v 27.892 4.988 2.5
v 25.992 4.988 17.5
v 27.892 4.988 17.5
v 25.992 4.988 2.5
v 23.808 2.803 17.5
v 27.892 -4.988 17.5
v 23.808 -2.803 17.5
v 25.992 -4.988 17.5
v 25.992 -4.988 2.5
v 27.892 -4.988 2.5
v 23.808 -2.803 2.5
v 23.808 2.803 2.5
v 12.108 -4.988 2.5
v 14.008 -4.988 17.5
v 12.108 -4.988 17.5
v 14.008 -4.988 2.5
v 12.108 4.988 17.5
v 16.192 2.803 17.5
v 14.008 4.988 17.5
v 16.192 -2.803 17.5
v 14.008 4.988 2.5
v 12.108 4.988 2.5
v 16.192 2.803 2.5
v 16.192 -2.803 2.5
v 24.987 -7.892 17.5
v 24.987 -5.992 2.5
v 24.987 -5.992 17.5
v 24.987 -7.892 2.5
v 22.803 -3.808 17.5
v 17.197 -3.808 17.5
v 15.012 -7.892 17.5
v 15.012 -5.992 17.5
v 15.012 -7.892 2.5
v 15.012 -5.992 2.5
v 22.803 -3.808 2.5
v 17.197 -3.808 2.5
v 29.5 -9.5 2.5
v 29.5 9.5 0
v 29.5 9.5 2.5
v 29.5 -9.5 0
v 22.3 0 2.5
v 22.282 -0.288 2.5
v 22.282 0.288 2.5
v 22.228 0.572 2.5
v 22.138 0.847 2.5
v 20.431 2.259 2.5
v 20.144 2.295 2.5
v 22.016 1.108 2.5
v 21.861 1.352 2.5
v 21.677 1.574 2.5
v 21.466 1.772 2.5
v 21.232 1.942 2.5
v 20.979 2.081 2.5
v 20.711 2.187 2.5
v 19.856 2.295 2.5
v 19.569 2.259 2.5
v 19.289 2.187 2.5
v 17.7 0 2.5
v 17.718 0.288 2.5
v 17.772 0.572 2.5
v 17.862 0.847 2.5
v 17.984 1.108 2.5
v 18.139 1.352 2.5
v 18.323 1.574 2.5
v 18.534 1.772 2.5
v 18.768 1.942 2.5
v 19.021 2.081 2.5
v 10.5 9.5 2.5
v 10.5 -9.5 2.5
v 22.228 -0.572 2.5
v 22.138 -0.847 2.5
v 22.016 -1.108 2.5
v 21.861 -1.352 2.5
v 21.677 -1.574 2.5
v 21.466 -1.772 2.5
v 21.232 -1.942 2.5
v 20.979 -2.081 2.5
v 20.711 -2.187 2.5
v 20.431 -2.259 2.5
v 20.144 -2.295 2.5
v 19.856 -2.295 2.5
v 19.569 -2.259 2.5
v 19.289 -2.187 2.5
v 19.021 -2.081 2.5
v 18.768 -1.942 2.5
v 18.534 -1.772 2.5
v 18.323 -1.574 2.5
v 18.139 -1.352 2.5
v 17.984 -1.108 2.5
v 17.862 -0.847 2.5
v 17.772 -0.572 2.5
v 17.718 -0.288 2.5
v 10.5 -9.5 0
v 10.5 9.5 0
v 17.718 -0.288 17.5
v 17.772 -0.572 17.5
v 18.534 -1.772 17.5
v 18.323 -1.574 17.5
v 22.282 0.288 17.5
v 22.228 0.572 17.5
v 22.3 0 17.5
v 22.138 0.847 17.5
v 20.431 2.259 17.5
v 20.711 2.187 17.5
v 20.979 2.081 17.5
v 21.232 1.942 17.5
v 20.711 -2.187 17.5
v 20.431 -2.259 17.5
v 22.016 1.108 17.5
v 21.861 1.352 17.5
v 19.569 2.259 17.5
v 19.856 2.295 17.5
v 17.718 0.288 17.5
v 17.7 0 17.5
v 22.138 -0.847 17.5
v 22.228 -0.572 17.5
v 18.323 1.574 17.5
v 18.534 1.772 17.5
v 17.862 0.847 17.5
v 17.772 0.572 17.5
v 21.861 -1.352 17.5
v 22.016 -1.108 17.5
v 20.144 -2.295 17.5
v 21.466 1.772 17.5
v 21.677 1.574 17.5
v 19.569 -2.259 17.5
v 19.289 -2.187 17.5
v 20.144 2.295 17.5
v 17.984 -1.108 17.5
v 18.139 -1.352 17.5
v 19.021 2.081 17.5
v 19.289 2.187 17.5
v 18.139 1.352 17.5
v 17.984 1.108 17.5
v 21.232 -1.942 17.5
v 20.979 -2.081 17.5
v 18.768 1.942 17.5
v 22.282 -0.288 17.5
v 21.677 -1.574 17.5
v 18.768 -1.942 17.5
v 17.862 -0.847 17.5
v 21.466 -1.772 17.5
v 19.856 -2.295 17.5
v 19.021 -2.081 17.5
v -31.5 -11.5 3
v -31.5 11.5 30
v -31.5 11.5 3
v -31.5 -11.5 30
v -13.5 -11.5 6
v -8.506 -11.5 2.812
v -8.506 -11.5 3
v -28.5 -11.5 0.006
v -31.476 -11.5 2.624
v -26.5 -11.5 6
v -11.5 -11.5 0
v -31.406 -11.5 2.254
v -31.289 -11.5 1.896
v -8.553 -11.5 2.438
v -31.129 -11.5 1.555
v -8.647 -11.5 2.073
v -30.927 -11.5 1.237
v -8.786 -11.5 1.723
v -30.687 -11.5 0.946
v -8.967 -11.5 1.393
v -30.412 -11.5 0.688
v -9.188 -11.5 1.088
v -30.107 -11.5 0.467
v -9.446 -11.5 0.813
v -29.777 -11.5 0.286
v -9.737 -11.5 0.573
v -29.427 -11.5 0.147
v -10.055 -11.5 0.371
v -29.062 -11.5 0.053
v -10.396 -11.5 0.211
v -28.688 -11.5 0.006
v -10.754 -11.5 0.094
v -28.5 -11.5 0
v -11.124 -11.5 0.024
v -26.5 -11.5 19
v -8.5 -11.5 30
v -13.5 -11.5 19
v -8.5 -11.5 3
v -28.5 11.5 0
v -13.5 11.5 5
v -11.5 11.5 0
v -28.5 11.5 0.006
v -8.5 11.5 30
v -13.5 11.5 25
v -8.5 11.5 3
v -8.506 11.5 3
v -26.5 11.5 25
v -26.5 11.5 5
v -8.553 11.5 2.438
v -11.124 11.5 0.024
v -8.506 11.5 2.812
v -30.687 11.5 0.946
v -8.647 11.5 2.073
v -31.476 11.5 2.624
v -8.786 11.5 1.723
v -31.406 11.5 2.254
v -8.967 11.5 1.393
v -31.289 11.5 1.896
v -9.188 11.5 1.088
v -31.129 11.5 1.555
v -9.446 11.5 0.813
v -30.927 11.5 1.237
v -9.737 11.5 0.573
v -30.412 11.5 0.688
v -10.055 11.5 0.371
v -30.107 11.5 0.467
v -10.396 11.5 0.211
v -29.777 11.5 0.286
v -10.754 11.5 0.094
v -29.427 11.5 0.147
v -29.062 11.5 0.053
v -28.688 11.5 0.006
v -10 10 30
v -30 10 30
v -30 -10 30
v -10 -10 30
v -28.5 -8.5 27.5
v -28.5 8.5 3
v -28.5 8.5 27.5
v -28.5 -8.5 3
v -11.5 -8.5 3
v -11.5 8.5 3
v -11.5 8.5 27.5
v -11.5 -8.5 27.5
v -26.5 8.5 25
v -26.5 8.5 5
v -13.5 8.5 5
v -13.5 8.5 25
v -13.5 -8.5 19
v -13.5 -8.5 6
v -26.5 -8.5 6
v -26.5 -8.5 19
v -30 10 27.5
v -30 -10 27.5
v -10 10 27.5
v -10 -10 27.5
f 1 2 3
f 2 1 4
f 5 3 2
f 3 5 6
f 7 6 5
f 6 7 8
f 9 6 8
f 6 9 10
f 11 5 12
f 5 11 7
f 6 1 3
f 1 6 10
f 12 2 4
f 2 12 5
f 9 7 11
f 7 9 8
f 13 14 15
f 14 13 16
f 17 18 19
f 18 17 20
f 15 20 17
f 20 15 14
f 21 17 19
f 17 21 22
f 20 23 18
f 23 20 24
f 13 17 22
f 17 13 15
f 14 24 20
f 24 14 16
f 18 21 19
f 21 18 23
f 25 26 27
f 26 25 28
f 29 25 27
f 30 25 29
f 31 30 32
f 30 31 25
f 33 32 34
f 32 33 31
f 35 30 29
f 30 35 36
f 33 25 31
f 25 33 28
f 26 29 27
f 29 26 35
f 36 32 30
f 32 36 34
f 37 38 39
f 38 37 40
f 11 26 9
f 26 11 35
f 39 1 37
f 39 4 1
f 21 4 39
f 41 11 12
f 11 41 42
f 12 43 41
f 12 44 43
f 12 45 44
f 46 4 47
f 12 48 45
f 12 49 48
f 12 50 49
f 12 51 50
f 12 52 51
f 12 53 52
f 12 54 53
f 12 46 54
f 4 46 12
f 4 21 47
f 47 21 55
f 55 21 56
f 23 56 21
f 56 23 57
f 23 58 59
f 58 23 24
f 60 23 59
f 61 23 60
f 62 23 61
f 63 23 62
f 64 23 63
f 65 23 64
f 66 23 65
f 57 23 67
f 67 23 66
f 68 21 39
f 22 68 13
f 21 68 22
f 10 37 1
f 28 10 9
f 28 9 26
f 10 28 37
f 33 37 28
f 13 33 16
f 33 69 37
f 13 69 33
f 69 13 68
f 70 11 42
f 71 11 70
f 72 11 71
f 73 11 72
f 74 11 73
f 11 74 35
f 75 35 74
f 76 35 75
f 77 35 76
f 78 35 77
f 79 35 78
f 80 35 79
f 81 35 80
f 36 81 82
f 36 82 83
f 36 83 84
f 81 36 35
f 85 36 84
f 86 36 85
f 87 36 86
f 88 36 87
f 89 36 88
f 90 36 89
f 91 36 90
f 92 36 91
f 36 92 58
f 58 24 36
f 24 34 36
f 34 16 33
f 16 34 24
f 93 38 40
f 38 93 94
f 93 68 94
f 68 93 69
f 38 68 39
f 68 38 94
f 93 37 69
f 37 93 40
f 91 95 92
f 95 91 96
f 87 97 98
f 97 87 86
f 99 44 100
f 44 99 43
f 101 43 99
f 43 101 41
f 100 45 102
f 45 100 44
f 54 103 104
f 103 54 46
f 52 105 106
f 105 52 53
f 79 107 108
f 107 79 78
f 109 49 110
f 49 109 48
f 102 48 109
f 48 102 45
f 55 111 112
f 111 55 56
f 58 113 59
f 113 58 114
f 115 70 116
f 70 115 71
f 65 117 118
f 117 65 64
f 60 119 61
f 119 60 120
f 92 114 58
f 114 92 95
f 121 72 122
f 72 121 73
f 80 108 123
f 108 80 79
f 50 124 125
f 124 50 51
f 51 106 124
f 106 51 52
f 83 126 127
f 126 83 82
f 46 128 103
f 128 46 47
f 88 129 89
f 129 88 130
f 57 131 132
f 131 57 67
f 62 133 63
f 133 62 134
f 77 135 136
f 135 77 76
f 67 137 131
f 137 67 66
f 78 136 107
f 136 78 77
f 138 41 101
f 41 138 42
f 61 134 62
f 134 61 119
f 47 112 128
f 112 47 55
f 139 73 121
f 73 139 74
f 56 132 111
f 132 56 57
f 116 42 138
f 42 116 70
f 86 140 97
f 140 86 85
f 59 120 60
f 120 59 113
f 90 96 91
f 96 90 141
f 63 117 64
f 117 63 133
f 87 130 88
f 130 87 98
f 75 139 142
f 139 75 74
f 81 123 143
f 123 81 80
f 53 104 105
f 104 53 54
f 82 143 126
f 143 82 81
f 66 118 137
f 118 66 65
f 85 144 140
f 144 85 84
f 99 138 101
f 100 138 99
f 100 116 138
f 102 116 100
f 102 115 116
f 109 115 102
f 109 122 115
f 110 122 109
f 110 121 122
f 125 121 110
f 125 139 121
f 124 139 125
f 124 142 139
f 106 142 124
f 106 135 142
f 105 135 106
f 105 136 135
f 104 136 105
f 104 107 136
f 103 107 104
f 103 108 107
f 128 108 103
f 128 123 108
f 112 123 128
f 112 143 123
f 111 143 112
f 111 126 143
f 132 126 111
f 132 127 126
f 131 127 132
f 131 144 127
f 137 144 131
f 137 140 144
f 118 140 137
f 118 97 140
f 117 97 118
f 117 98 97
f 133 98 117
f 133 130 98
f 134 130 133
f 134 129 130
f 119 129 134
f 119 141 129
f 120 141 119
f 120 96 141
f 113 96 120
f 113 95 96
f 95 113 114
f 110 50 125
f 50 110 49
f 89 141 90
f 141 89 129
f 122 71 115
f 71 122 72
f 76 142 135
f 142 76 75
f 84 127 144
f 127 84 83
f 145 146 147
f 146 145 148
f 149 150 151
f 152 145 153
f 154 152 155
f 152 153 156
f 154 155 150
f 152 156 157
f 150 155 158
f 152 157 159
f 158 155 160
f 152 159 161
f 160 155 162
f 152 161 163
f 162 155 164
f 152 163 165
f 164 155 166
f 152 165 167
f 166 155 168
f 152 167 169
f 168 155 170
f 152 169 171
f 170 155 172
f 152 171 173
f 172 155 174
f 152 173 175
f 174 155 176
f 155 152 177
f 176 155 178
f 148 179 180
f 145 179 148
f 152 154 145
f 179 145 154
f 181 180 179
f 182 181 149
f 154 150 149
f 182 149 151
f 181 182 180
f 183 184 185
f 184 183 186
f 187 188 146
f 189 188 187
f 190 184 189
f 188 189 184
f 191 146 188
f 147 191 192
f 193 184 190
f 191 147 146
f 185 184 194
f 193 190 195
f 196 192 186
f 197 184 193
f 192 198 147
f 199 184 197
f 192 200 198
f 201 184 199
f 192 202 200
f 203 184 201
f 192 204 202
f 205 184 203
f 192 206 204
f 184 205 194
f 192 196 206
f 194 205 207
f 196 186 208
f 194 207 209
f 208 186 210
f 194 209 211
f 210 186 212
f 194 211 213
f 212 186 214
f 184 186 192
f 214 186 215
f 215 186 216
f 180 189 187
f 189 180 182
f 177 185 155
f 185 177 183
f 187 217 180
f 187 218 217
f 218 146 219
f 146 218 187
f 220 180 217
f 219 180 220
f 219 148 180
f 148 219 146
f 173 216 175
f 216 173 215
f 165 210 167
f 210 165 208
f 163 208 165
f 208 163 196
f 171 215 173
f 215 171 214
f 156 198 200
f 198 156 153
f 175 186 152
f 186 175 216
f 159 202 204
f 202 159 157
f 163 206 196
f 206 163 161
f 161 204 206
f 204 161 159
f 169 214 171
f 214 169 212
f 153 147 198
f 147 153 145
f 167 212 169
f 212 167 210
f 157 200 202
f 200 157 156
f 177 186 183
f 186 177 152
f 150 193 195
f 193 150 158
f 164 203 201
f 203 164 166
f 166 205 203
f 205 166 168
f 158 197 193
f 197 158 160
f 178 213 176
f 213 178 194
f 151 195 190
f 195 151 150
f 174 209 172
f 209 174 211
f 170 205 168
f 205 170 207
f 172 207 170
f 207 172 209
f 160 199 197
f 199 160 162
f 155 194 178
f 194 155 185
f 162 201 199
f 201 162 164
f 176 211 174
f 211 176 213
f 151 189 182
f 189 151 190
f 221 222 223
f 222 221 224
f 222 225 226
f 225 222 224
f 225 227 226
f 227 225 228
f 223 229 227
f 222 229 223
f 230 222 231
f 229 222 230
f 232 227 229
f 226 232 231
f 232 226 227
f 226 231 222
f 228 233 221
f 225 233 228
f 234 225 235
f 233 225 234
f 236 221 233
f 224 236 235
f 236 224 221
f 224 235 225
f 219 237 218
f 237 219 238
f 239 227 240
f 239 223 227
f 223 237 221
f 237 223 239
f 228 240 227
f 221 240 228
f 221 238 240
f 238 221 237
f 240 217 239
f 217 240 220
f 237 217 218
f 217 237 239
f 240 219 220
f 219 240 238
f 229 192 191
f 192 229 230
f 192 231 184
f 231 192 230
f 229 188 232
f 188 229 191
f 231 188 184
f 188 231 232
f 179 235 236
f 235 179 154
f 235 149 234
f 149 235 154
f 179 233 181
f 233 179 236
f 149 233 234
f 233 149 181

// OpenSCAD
$fn=50;
snugness_factor=0.95;

translate([20,0,1.25]) makebase();
translate([-20,0,15]) rotate([0,180,0]) makebox();

module makebox()
{
  difference()
  {
    translate([0,0,-1.5]) rotate([90,0,0]) roundedbox(23,33,23,3); // Main box part
    translate([0,0,-17]) cube([40,40,4],center=true); // Chop of rounded bottom
    translate([0,0,-3]) cube([17,17,30],center=true); // Hollow inside
    translate([0,0,-15]) cube([20,20,5],center=true); // Inset for base
    translate([0,10,0]) cube([13,5,20],center=true); // Switch cutout
    translate([0,-10,2.5]) cube([13,5,13],center=true); // Cables cutout
  }
}

module makebase()
{
  union()
  {
    cube([19,19,2.5],center=true);
    translate([0,0,((16/2)+1.25)-1]) cylinder(16,4.6/2,4.6/2,center=true); // Rod for central 5mm dia hole
    translate([10-4.15,0,((16/2)+1.25)-1]) rotate([0,0,90]) makesideinsert();
    translate([-(10-4.15),0,((16/2)+1.25)-1]) rotate([0,0,-90]) makesideinsert();
    translate([0,-(10-4.15),((16/2)+1.25)-1]) rotate([0,0,0]) makesideinsert();
  }
}

module makesideinsert()
{
  scale([snugness_factor,snugness_factor,1])
  {
    difference()
    {
      cube([10.5,4.3,11+5],center=true);
      translate([(10.5/2)+((4/1.414)/2),(4.3/2)+((4/1.414)/2)-2.3,0]) rotate([0,0,45]) cube([4,10,13+5],center=true);
      translate([-((10.5/2)+((4/1.414)/2)),(4.3/2)+((4/1.414)/2)-2.3,0]) rotate([0,0,-45]) cube([4,10,13+5],center=true);
    }
  }
}

module roundedbox(l,d,h,r)
{
  difference()
  {
    difference()
    {
      difference()
      {
        difference()
        {
          cube([l,d,h],center=true);
          translate([-(l/2)+r,-(d/2)+r,0]){corner(r,h,0);};
        }
        translate([(l/2)-r,-(d/2)+r,0]){corner(r,h,90);};
      }
      translate([(l/2)-r,(d/2)-r,0]){corner(r,h,180);};
    }
    translate([-(l/2)+r,(d/2)-r,0]){corner(r,h,270);};
  }
}

module corner(r,h,ang)
{
  rotate([0,0,ang])
  {
    difference()
    {
      difference()
      {
        difference()
        {
          cylinder(h*2,r*2,r*2,center=true);
          cylinder(h*2,r,r,center=true);
        }
        translate([r*5,0,0]){cube([r*10,r*10,h*2],center=true);}
      }
      translate([0,r*5,0]){cube([r*10,r*10,h*2],center=true);}
    }
  }
}
